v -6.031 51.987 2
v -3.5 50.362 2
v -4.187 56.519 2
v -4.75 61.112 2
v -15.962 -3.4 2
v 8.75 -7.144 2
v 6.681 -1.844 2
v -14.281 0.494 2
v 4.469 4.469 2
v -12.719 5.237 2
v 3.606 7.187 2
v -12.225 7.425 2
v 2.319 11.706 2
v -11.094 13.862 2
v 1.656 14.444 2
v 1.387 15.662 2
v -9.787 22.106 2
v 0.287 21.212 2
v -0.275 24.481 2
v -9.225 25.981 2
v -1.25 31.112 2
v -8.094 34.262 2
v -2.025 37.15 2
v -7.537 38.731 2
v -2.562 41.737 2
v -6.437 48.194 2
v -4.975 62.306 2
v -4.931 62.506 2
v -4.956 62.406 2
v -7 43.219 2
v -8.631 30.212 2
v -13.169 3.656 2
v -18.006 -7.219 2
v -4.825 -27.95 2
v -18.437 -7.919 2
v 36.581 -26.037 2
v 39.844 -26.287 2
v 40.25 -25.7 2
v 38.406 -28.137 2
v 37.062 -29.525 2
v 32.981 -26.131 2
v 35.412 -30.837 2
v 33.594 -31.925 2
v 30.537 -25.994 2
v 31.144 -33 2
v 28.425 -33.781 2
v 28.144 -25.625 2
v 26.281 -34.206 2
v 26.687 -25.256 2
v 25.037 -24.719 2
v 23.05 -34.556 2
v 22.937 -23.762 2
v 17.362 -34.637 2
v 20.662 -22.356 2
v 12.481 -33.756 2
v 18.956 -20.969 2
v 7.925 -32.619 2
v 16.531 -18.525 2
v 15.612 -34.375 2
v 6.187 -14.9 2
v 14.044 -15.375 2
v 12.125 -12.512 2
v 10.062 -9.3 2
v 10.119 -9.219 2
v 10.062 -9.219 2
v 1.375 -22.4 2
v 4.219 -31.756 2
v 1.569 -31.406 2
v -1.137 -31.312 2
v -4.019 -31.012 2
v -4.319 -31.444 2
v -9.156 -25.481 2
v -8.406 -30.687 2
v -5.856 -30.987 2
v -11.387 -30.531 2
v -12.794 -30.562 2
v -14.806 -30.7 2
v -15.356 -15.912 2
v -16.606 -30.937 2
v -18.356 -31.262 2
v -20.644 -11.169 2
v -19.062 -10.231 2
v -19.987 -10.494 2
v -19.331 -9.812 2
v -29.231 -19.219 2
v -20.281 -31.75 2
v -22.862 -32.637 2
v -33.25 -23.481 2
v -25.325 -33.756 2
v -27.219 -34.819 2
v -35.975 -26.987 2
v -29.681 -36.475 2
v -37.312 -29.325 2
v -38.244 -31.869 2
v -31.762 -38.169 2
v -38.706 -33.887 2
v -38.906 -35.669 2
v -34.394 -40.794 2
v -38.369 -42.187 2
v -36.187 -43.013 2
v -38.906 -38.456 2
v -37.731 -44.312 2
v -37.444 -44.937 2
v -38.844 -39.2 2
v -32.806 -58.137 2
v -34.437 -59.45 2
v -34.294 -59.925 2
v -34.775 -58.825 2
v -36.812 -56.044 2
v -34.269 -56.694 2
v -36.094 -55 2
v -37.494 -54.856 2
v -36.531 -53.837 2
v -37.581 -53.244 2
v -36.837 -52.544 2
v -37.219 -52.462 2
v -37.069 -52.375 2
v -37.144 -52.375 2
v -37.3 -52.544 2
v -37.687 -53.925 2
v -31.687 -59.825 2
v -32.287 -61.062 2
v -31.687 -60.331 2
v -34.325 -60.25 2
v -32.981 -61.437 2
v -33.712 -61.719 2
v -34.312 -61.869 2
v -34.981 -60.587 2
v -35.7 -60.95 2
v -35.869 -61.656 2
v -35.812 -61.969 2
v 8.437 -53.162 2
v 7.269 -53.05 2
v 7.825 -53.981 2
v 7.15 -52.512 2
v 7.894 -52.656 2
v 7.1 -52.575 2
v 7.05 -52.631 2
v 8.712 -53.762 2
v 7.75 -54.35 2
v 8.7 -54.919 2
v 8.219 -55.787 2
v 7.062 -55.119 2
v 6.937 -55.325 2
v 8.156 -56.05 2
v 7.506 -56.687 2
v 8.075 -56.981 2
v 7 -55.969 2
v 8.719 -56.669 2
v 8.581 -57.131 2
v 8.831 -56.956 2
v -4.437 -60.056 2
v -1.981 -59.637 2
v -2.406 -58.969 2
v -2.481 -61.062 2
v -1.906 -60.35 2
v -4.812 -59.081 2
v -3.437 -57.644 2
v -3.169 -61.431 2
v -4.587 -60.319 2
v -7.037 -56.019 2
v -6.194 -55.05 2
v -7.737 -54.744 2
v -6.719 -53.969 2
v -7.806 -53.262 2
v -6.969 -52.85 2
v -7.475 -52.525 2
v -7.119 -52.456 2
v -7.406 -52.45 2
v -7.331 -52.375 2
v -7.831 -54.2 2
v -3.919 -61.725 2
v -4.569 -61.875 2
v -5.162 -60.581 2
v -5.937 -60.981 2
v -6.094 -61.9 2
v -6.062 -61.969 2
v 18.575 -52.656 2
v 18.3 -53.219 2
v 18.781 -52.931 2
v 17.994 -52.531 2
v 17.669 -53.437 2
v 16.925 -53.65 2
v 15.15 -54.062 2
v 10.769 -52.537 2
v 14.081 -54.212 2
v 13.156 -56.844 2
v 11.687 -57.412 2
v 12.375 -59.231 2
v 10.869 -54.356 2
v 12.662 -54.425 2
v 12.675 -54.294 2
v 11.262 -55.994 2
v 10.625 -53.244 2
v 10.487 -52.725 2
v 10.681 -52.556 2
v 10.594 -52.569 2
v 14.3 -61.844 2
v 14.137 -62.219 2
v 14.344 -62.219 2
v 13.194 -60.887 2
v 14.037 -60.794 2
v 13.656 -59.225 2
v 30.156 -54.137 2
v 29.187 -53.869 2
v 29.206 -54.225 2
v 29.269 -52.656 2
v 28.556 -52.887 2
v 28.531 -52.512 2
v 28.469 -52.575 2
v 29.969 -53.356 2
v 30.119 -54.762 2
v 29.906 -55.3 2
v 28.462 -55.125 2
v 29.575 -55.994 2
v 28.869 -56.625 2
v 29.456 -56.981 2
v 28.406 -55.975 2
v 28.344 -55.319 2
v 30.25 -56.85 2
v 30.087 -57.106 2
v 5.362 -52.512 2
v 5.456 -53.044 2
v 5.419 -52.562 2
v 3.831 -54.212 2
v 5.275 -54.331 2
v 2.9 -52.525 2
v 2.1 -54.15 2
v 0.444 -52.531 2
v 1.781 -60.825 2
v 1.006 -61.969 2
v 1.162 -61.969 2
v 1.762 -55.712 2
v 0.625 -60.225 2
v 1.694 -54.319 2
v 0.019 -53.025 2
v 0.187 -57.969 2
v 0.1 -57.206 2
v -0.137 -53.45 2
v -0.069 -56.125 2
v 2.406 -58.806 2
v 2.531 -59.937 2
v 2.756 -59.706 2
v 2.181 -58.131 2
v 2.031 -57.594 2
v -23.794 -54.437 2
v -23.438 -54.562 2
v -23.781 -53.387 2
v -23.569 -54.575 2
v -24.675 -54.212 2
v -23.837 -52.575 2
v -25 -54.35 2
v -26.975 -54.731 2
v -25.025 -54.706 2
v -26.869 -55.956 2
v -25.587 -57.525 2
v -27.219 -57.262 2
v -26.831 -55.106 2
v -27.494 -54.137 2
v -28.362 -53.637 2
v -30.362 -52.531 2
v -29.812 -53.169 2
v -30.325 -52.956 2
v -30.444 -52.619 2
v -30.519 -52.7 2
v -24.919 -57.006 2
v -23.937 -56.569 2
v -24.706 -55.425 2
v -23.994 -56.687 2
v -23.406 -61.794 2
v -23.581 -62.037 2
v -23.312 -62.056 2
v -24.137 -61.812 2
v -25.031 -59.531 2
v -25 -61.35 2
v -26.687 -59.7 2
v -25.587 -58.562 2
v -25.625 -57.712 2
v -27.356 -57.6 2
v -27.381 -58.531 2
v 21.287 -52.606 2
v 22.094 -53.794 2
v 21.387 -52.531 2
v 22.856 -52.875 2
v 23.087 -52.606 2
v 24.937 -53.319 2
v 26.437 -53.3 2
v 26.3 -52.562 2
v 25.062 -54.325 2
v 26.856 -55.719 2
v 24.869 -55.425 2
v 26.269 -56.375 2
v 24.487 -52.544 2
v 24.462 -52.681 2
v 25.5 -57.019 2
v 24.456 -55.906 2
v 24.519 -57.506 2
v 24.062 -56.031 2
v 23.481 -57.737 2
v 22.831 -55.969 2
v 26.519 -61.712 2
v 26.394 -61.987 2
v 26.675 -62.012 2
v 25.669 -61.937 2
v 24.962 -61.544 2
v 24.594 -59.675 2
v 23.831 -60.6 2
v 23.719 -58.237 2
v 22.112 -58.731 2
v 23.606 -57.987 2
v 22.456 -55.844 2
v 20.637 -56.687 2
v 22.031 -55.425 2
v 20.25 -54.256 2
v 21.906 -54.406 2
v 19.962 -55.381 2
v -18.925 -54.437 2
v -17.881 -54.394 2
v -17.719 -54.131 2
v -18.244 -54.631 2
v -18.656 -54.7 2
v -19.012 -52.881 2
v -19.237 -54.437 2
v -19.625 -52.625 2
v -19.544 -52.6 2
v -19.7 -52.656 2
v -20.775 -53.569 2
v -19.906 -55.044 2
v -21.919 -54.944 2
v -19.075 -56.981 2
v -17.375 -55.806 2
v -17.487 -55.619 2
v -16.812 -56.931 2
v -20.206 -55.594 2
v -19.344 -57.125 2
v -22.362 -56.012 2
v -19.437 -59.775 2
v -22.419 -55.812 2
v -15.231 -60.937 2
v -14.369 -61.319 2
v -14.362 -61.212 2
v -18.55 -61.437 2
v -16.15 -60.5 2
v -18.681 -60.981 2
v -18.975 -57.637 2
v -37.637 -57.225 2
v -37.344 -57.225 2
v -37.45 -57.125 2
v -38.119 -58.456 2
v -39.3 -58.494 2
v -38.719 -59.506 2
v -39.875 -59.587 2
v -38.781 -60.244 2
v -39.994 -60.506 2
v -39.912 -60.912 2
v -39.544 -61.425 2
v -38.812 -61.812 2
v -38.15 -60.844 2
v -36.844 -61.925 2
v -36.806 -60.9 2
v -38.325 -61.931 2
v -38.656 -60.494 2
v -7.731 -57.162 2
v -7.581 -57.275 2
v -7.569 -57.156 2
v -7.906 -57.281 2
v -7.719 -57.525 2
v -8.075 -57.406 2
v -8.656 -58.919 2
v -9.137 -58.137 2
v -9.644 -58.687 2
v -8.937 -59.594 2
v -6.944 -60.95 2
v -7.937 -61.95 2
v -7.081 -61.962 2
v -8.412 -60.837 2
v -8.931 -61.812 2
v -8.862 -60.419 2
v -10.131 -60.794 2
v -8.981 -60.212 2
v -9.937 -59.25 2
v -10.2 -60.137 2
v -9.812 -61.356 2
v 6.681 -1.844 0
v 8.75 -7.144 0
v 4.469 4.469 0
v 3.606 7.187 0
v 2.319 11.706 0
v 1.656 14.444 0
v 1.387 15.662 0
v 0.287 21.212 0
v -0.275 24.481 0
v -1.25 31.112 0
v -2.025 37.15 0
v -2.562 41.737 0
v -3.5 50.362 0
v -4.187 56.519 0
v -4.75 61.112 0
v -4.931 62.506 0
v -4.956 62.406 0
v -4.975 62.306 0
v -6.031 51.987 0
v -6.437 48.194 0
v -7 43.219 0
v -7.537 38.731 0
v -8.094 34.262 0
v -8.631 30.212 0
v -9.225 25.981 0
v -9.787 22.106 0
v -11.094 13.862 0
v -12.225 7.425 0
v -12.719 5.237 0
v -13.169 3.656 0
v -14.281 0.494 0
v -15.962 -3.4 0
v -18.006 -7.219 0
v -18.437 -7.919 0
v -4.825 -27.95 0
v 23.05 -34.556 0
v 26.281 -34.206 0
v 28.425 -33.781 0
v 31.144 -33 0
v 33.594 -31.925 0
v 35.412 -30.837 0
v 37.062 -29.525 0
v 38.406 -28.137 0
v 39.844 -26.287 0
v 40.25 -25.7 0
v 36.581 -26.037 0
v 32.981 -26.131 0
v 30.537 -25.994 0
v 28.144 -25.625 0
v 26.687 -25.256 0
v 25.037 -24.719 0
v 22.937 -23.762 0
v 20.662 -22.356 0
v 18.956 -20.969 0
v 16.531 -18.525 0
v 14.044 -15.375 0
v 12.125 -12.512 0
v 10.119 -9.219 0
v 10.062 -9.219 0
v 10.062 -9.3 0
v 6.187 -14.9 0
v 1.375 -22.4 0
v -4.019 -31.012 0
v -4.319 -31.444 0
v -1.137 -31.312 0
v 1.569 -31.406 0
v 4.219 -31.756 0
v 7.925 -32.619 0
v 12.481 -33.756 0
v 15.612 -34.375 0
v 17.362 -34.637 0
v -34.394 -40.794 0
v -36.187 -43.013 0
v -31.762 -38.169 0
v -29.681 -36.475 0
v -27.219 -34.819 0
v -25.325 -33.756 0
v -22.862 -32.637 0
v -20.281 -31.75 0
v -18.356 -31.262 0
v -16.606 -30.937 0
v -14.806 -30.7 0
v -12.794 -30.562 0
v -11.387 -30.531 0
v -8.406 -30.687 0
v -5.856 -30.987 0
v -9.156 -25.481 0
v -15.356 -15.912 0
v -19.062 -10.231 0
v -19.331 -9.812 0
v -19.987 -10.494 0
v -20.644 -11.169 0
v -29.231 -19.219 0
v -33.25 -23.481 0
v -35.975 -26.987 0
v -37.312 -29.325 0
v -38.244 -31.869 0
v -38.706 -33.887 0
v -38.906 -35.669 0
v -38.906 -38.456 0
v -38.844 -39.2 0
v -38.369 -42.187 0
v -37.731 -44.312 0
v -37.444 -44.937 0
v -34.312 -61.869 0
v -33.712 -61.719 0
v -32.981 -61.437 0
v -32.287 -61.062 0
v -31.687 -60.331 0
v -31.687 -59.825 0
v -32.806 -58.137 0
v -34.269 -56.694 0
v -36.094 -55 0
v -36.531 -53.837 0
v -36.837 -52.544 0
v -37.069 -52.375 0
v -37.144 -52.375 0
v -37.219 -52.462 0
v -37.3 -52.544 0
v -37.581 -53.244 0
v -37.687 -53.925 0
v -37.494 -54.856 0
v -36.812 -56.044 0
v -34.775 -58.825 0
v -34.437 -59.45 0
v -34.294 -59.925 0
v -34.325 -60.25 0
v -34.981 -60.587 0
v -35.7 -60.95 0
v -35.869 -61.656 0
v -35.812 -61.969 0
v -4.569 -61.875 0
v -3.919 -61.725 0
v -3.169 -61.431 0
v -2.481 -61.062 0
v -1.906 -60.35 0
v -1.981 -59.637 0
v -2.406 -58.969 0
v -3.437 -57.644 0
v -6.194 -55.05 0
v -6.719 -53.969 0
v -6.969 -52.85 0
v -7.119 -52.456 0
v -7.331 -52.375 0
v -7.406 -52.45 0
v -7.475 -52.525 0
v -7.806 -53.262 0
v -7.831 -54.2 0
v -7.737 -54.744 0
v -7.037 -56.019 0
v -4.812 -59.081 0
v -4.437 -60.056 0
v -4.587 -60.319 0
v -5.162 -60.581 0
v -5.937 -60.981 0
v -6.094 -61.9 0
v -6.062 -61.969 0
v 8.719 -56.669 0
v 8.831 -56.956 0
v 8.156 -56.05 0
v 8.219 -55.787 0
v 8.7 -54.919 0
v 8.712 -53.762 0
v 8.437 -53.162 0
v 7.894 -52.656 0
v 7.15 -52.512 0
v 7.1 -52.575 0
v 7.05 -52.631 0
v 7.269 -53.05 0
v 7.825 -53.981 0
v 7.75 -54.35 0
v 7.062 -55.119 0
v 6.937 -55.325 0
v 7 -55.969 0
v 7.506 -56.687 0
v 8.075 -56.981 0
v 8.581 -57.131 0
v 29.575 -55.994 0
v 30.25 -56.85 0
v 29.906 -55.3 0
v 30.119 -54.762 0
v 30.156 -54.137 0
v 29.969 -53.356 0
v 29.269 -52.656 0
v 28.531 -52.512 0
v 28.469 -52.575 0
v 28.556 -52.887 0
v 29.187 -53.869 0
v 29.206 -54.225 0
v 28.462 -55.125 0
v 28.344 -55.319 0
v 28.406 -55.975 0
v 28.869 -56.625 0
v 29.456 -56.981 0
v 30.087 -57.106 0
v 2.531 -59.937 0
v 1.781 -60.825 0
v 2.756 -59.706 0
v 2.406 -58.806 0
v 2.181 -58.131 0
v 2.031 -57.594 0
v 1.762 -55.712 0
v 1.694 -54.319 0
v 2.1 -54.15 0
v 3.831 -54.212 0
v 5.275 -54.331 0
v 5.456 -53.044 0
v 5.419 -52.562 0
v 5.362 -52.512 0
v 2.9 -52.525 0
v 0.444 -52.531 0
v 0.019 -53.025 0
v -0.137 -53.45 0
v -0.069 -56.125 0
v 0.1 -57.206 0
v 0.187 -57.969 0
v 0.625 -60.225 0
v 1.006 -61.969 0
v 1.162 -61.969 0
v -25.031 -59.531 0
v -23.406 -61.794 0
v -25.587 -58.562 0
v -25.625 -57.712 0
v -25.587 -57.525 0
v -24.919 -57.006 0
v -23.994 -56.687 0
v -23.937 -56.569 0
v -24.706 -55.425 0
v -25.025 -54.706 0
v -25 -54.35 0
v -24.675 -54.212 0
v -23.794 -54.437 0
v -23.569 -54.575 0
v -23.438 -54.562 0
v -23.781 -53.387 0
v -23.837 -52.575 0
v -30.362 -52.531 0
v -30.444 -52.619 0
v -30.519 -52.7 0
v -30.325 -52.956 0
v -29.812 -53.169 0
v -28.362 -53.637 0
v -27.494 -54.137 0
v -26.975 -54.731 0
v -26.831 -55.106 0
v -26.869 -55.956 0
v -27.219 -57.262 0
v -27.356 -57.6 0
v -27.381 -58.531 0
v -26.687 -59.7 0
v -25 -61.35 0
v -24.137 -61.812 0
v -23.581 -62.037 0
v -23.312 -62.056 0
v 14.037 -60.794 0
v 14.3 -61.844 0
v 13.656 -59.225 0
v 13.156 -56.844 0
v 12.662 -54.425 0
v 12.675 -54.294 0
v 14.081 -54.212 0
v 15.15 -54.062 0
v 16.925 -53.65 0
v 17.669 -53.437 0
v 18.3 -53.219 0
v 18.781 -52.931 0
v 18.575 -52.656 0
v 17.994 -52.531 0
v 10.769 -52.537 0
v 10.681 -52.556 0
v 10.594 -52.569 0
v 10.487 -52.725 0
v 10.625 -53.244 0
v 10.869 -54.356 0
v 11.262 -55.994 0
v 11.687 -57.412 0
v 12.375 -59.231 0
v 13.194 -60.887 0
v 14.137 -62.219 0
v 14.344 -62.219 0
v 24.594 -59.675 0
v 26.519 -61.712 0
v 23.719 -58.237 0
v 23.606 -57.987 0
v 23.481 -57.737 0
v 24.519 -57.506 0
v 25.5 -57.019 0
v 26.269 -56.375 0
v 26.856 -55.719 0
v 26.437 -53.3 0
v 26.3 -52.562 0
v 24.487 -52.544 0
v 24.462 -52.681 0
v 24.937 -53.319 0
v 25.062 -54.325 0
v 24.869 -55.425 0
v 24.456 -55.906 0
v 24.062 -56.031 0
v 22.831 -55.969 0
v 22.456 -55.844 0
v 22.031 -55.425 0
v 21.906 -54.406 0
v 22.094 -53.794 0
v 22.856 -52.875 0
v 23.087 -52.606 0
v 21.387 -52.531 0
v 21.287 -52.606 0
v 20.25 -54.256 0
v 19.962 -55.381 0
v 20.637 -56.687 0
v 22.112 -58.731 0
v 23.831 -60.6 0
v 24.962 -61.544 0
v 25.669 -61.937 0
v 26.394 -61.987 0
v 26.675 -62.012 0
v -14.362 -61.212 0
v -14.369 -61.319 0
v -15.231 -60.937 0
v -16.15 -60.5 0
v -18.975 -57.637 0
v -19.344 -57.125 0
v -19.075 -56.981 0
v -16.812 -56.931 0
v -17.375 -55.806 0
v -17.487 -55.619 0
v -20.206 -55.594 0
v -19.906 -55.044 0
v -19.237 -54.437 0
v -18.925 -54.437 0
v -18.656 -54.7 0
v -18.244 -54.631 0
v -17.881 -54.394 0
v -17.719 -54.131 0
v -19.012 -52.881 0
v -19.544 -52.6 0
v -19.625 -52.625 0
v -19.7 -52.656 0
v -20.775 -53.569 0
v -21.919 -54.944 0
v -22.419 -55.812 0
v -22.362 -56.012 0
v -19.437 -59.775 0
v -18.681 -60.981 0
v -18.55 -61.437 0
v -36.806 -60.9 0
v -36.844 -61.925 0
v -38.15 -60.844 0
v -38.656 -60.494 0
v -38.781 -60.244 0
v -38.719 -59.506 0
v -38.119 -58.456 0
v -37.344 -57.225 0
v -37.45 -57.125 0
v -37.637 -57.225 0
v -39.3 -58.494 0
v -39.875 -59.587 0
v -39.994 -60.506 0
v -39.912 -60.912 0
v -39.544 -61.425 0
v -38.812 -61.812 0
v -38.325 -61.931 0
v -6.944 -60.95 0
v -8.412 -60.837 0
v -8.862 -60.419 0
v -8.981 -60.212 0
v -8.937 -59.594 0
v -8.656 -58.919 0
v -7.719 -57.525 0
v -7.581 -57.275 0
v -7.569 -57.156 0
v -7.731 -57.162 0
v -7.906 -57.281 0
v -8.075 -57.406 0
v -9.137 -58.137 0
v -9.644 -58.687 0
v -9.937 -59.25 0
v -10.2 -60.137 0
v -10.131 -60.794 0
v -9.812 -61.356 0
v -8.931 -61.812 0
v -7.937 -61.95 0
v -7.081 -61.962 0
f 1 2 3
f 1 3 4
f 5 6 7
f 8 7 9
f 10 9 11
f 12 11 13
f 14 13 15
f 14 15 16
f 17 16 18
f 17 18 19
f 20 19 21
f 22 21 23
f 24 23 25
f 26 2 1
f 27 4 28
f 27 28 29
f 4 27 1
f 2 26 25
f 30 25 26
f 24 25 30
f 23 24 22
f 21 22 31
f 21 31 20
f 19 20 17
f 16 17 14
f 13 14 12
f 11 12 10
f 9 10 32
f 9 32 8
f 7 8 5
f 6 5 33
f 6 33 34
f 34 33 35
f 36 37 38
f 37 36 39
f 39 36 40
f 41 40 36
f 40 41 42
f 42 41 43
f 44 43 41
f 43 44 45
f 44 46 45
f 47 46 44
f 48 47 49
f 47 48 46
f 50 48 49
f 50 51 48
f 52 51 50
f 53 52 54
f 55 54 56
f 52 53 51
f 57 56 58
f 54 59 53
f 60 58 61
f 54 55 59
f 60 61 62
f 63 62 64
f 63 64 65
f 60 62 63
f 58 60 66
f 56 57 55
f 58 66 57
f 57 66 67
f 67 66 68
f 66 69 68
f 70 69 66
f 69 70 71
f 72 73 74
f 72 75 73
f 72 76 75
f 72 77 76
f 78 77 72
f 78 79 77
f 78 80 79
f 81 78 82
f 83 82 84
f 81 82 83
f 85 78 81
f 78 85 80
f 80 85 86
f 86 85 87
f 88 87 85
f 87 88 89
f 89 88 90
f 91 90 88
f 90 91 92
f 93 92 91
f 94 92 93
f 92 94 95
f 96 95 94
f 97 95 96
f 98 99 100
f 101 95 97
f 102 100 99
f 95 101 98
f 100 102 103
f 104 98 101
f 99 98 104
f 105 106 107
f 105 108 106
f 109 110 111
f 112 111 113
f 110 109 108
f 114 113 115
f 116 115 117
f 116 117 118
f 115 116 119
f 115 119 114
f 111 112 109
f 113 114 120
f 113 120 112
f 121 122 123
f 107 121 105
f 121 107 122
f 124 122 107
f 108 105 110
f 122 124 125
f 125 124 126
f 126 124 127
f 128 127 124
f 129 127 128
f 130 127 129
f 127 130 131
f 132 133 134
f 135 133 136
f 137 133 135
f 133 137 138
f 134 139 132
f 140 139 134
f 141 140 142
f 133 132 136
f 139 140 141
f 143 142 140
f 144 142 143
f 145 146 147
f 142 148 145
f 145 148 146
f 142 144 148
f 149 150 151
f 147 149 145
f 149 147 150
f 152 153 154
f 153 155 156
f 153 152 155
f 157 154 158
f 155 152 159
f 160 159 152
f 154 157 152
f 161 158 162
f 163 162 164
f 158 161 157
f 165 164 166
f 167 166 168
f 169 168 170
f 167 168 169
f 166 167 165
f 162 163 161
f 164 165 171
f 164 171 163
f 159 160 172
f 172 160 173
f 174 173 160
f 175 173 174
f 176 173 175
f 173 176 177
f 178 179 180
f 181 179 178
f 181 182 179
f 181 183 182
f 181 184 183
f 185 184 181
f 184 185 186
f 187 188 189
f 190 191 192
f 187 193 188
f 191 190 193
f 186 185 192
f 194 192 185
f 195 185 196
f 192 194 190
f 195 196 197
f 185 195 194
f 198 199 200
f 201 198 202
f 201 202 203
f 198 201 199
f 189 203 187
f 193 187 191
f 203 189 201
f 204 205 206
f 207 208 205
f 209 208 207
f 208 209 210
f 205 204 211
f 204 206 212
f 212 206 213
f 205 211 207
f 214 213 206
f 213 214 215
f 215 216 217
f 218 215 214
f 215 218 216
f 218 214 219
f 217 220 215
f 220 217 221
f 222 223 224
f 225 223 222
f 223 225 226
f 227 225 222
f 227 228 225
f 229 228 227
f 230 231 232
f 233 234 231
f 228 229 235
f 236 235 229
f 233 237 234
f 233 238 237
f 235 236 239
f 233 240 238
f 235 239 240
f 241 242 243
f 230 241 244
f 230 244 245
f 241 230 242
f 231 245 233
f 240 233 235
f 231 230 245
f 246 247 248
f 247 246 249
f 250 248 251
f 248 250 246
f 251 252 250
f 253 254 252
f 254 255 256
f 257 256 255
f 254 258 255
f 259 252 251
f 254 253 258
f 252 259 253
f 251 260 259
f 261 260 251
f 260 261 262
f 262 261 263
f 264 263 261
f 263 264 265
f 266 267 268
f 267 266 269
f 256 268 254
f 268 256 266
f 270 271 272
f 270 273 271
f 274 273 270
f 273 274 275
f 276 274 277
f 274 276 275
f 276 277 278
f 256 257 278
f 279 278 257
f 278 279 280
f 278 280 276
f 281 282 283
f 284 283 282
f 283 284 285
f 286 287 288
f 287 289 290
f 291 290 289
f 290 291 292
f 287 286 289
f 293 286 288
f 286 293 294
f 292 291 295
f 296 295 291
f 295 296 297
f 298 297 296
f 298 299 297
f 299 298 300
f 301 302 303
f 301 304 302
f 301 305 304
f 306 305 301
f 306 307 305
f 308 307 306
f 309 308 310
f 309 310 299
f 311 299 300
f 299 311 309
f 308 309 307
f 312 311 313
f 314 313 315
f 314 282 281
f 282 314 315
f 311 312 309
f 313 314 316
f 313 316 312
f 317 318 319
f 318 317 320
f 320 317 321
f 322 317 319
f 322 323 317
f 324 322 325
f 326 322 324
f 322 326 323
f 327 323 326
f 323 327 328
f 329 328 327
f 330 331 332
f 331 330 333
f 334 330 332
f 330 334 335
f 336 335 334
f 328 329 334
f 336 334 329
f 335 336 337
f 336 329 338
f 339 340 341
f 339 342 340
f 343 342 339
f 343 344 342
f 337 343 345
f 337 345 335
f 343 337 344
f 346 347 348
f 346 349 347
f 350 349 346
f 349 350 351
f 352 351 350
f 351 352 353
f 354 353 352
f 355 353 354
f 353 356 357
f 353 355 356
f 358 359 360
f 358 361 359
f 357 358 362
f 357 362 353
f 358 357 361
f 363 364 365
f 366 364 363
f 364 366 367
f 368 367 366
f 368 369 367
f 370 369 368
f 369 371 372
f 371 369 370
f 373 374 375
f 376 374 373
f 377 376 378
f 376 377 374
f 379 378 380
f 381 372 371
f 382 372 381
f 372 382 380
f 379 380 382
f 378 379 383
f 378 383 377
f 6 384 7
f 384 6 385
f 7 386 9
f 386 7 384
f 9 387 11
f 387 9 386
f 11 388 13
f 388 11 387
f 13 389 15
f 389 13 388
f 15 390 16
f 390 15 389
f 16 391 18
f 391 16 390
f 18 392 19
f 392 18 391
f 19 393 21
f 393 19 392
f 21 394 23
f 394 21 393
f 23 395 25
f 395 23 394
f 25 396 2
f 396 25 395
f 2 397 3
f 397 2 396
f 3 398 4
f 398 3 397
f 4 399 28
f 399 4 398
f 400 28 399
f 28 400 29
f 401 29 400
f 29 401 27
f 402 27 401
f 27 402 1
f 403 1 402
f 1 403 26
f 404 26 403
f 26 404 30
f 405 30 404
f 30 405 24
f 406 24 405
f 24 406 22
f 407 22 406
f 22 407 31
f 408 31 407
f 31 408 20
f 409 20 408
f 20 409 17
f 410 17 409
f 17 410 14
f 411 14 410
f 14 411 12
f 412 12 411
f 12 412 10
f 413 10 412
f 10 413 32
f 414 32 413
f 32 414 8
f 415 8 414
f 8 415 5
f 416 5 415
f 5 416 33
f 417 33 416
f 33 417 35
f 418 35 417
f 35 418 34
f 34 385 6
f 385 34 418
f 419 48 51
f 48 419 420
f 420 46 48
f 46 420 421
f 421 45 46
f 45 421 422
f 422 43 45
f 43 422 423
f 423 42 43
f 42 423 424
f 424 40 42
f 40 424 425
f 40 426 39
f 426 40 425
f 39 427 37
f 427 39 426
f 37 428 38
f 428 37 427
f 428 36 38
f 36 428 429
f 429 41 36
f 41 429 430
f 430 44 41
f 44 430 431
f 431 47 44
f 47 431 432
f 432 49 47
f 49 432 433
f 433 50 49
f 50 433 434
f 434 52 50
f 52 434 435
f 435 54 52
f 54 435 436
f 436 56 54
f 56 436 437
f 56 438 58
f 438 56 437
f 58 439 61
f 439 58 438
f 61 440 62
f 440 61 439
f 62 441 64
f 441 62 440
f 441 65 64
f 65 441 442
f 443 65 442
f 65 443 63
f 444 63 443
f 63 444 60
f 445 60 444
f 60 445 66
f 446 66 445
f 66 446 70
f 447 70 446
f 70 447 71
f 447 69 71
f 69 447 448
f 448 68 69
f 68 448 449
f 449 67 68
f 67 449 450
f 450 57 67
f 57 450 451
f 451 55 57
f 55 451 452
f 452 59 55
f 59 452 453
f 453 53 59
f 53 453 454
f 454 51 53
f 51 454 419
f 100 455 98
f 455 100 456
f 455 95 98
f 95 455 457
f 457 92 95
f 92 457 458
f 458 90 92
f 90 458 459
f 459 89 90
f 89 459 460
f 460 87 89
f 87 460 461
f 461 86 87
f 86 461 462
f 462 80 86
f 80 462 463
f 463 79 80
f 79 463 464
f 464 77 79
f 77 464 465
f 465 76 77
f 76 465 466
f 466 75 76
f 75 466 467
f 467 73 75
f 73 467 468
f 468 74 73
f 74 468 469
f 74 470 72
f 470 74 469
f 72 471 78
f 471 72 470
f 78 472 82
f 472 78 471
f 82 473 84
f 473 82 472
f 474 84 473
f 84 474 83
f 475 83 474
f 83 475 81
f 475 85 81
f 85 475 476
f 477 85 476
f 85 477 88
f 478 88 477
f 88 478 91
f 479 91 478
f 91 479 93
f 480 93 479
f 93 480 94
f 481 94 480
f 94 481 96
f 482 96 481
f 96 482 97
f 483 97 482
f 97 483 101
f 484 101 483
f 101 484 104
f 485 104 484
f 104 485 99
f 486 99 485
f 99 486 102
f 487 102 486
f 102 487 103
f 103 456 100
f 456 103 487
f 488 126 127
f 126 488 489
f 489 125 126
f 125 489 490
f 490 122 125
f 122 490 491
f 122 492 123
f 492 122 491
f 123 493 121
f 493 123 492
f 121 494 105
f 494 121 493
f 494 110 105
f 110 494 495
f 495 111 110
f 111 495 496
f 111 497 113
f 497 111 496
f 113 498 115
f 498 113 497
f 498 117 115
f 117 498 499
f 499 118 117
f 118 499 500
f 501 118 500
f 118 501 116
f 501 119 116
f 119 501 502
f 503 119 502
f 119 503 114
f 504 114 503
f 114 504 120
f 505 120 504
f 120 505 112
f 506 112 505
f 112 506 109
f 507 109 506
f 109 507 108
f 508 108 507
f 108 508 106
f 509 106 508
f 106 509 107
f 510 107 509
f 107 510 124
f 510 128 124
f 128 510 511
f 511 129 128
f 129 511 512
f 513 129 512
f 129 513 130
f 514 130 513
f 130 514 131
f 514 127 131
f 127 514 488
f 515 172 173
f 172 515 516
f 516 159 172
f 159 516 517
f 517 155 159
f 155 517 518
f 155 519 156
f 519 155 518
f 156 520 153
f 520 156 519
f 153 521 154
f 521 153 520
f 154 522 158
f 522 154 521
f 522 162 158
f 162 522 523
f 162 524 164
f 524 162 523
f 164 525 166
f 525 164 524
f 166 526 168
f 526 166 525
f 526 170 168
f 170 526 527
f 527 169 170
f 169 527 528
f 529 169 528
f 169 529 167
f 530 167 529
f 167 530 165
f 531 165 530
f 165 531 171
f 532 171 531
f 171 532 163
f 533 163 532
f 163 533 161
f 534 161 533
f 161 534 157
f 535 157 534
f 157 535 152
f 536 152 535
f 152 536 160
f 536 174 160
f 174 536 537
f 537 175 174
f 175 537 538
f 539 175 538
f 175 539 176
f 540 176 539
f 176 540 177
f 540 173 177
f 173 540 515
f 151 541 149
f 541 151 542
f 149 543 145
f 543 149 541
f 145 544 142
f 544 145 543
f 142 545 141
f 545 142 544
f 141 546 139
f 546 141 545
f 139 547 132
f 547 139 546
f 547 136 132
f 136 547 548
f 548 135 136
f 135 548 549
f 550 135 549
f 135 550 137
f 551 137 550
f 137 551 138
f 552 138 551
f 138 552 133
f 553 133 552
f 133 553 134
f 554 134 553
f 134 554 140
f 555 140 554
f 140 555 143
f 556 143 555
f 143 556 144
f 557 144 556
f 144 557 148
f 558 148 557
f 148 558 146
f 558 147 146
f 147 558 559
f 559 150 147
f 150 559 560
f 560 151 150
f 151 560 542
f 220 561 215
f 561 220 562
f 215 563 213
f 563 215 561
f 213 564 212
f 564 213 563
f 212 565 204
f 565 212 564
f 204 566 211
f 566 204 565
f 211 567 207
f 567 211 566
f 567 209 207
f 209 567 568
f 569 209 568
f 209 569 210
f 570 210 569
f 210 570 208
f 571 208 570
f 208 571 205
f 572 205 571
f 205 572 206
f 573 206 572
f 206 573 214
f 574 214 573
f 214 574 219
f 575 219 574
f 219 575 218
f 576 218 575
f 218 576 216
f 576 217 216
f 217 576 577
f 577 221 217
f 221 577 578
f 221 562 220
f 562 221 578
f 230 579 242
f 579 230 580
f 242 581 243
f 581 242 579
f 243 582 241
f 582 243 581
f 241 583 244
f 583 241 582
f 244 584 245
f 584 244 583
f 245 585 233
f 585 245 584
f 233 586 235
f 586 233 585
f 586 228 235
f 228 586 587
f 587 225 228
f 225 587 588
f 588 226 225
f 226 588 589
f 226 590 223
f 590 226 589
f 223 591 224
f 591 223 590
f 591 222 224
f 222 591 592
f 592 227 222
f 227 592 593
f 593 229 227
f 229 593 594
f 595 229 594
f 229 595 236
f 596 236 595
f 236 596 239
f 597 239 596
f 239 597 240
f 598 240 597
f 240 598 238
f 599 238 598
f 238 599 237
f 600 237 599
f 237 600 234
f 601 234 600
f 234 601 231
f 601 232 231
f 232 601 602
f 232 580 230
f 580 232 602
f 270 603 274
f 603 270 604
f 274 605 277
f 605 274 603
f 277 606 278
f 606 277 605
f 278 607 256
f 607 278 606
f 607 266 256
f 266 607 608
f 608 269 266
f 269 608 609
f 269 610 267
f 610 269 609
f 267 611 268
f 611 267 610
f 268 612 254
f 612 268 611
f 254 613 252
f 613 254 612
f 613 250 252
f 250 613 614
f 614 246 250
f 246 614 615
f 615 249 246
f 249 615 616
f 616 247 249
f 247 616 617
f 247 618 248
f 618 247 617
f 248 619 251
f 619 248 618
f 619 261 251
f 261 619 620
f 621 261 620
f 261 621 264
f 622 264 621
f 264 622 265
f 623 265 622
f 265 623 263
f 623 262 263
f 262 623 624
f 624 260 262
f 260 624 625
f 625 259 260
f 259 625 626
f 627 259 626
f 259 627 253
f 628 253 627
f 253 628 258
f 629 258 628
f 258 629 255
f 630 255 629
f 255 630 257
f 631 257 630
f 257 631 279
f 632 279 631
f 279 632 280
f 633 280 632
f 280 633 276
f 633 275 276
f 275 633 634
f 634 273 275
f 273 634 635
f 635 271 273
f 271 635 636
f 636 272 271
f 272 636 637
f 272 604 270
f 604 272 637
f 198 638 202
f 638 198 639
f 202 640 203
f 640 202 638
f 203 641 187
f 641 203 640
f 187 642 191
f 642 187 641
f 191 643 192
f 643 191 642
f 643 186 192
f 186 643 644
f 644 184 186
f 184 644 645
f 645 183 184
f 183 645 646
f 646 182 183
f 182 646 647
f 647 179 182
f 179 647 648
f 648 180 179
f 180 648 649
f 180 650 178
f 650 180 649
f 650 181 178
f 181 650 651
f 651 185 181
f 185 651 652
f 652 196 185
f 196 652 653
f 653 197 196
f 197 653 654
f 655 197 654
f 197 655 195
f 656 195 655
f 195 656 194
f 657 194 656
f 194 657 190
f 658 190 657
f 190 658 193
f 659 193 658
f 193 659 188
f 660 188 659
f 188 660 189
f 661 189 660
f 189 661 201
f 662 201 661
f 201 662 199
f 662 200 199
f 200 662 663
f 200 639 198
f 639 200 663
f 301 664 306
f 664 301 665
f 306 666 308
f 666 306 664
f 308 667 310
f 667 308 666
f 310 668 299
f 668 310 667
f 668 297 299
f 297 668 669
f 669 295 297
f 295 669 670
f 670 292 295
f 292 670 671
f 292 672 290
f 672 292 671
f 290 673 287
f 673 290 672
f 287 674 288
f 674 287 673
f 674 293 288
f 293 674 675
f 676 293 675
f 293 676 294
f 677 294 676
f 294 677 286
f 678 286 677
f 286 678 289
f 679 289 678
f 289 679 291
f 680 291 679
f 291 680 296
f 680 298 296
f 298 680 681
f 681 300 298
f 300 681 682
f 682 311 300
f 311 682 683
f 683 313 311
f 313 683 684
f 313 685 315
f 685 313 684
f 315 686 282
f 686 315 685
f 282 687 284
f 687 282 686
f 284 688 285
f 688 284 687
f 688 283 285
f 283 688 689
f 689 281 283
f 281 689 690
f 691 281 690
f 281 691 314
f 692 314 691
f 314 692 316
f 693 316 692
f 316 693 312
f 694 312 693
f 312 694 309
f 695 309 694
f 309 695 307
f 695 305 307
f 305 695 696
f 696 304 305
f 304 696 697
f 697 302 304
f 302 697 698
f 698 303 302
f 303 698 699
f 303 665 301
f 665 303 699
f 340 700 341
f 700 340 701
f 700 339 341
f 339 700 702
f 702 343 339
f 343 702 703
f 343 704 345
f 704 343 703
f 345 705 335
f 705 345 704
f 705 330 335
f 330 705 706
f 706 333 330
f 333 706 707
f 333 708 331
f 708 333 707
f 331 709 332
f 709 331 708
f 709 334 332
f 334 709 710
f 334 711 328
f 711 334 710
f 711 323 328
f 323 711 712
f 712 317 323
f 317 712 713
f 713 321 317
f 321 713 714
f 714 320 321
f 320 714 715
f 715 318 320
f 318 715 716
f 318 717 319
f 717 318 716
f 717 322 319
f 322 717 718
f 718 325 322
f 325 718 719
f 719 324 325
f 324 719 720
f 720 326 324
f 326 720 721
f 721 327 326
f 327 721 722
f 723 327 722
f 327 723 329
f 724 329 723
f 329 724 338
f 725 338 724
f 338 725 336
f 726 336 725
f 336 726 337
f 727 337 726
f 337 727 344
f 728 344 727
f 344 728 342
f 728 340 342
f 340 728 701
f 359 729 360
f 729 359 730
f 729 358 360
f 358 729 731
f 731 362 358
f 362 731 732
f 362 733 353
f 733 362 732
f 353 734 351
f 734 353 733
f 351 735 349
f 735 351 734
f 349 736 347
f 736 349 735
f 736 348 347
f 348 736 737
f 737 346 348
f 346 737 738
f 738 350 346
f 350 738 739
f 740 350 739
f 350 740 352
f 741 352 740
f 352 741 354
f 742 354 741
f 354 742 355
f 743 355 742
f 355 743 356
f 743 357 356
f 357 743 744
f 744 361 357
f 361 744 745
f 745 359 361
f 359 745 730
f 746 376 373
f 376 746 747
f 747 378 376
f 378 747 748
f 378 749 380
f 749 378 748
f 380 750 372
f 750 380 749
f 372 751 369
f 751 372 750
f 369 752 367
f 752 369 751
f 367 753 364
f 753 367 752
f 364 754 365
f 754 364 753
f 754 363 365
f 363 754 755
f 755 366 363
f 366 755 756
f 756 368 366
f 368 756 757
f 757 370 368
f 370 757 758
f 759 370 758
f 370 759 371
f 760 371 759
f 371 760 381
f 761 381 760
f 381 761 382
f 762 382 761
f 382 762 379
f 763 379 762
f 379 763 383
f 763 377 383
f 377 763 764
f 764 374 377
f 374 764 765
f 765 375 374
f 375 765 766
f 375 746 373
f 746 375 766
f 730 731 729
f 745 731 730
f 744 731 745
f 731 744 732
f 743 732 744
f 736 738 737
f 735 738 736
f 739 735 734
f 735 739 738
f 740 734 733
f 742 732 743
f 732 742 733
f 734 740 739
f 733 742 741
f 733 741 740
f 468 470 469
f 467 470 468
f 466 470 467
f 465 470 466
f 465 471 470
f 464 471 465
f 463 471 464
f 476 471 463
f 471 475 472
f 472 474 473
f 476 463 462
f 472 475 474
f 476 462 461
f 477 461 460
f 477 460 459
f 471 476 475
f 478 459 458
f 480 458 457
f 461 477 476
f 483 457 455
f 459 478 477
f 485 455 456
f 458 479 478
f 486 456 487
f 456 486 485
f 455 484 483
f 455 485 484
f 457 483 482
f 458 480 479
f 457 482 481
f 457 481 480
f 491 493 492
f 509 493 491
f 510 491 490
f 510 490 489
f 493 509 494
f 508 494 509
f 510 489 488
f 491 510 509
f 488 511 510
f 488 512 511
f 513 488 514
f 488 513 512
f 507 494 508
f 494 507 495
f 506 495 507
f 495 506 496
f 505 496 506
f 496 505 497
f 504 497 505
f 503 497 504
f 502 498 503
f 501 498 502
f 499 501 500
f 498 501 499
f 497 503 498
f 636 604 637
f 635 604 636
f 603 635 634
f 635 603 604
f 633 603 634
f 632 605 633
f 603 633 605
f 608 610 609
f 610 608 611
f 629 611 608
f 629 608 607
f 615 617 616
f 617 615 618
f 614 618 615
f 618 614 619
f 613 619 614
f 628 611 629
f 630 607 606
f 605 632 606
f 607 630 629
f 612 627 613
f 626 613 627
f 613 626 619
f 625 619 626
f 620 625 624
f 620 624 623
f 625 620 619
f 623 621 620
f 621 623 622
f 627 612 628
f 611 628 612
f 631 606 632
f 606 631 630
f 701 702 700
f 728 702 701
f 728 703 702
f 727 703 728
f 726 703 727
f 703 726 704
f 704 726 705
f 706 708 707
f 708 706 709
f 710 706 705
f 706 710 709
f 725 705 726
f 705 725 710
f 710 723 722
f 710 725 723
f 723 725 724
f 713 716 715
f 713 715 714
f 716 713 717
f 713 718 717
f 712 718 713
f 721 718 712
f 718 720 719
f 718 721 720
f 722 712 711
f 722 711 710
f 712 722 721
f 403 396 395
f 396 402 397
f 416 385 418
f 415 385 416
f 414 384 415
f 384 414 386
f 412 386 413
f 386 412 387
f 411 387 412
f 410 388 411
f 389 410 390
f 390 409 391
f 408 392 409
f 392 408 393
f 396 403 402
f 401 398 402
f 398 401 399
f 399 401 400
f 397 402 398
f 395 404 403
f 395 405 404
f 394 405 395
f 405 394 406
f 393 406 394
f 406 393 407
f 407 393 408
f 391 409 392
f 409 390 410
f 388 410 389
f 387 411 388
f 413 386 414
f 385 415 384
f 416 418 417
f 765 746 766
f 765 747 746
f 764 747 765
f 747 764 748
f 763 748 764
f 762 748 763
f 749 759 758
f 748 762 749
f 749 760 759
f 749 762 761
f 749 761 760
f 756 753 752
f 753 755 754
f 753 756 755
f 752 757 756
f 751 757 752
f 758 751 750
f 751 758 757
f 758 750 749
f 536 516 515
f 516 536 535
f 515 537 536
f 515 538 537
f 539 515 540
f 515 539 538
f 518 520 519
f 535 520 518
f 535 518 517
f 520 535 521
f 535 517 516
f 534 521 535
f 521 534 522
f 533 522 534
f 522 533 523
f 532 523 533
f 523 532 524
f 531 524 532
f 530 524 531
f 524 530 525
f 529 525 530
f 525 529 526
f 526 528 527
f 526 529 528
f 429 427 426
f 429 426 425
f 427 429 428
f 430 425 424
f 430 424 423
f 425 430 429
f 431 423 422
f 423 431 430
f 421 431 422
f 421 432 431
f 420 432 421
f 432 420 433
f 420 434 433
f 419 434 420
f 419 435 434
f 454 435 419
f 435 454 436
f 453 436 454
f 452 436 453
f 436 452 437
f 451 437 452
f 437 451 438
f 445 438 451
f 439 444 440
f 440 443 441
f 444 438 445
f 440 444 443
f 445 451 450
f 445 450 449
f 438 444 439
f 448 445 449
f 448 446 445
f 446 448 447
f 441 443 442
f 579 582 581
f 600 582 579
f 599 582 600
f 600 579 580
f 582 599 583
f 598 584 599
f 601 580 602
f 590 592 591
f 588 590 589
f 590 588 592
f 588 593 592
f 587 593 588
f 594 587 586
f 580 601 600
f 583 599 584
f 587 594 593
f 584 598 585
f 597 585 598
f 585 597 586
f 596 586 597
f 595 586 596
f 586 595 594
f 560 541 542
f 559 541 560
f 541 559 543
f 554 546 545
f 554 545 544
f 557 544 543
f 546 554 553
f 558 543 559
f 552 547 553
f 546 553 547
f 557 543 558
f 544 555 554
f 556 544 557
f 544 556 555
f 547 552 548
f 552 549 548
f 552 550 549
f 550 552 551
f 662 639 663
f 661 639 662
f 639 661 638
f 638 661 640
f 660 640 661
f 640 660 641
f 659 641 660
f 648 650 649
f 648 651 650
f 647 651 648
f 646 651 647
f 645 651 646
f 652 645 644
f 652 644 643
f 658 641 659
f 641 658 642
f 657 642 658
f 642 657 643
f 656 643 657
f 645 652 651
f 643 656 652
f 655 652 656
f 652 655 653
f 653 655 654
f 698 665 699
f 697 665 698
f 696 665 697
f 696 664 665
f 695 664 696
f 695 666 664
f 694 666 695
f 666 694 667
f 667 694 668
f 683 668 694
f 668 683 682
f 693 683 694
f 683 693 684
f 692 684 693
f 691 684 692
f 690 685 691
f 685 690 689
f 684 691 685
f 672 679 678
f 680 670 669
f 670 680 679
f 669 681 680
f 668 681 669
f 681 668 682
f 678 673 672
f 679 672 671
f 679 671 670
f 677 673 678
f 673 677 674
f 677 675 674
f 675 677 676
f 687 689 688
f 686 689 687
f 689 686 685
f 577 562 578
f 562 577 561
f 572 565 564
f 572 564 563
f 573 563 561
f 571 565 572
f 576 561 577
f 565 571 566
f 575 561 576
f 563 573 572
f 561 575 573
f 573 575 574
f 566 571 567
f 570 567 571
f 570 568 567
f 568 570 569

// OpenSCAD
module 17244f0232cb8f6ca03ed6fc7fb4ccea_1()
{
 /* Generated by trace2scad version 20150415
    http://aggregate.org/MAKE/TRACE2SCAD/
    Optimized model has 387/4796 original points
 */
 color([0.48, 0.48, 0.48])
 assign(minx=0) /* polygon minx=39 */
 assign(miny=0) /* polygon miny=45 */
 assign(maxx=12880) /* polygon maxx=12880 */
 assign(maxy=20000) /* polygon maxy=20001 */
 assign(dx=maxx-minx)
 assign(dy=maxy-miny)
 assign(maxd=((dx>dy)?dx:dy))
 scale([1/maxd, 1/maxd, 1])
 translate([-minx-dx/2, -miny-dy/2, 0])
 linear_extrude(height=1, convexity=387)
 union() {
  union() {
   polygon([[5647,19985],[5644,19969],[5475,18318],[5410,17711],[5320,16915],[5234,16197],[5145,15482],[5059,14834],[4964,14157],[4874,13537],[4665,12218],[4484,11188],[4405,10838],[4333,10585],[4155,10079],[3886,9456],[3559,8845],[3490,8733],[5668,5528],[7840,8857],[7509,9705],[7155,10715],[7017,11150],[6811,11873],[6705,12311],[6662,12506],[6486,13394],[6396,13917],[6240,14978],[6116,15944],[6030,16678],[5880,18058],[5770,19043],[5680,19778],[5651,20001]], convexity=6);
   polygon([[8050,8518],[8050,8512],[7430,7616],[6660,6416],[5797,5038],[5749,4969],[6258,4990],[6691,4975],[7115,4919],[7708,4781],[8437,4599],[8938,4500],[9218,4458],[10128,4471],[10645,4527],[10988,4595],[11423,4720],[11815,4892],[12106,5066],[12370,5276],[12585,5498],[12815,5794],[12880,5888],[12293,5834],[11717,5819],[11326,5841],[10943,5900],[10710,5959],[10446,6045],[10110,6198],[9746,6423],[9473,6645],[9085,7036],[8687,7540],[8380,7998],[8059,8525],[8050,8525]], convexity=9);
   polygon([[3242,8321],[3137,8213],[1763,6925],[1120,6243],[684,5682],[470,5308],[321,4901],[247,4578],[215,4293],[215,3847],[225,3728],[301,3250],[403,2910],[449,2810],[650,3118],[937,3473],[1358,3893],[1691,4164],[2085,4429],[2388,4599],[2782,4778],[3195,4920],[3503,4998],[3783,5050],[4071,5088],[4393,5110],[4618,5115],[5095,5090],[5503,5042],[4975,5923],[3983,7454],[3390,8363],[3347,8430]], convexity=7);
   polygon([[485,1606],[472,1593],[427,1481],[410,1372],[441,1223],[550,1033],[876,588],[930,488],[953,412],[948,360],[843,306],[728,248],[701,135],[710,85],[950,101],[1046,125],[1163,170],[1274,230],[1370,347],[1370,428],[1191,698],[957,929],[665,1200],[595,1386],[546,1593],[509,1620],[497,1620]], convexity=8);
   polygon([[5255,1608],[5244,1596],[5191,1478],[5187,1328],[5202,1241],[5314,1037],[5670,547],[5730,391],[5706,349],[5614,307],[5490,243],[5465,96],[5470,85],[5709,100],[5813,124],[5933,171],[6043,230],[6135,344],[6123,458],[6055,565],[5890,777],[5449,1192],[5365,1365],[5325,1544],[5301,1607],[5267,1620]], convexity=8);
   polygon([[6904,1596],[6511,1595],[6443,1516],[6418,1448],[6429,1020],[6456,847],[6470,725],[6540,364],[6601,85],[6626,85],[6725,268],[6845,410],[6881,447],[6825,591],[6789,699],[6765,785],[6722,1086],[6711,1309],[6776,1336],[7053,1326],[7284,1307],[7313,1513],[7307,1590],[7298,1598]], convexity=10);
   polygon([[7576,1588],[7568,1579],[7603,1512],[7692,1363],[7680,1304],[7570,1181],[7550,1148],[7560,1045],[7641,930],[7732,883],[7813,859],[7853,887],[7835,933],[7745,1032],[7755,1074],[7832,1213],[7834,1398],[7790,1494],[7703,1575],[7584,1598]], convexity=10);
   polygon([[11000,1593],[10995,1588],[11009,1538],[11110,1381],[11113,1324],[10994,1180],[10975,1149],[10985,1044],[11059,940],[11153,883],[11254,863],[11280,904],[11172,1041],[11225,1152],[11259,1238],[11265,1338],[11235,1463],[11123,1575],[11005,1598]], convexity=10);
   polygon([[1569,1581],[1557,1568],[1588,1527],[1670,1493],[1902,1418],[2041,1338],[2124,1243],[2147,1183],[2141,1047],[2085,838],[2063,784],[2059,635],[2170,448],[2440,184],[2578,110],[2667,74],[2710,71],[2695,113],[2435,475],[2346,630],[2340,766],[2346,796],[2453,879],[2601,930],[2610,949],[2487,1132],[2436,1247],[2440,1304],[2492,1326],[2633,1290],[2669,1268],[2690,1270],[2635,1458],[2626,1588],[1582,1595]], convexity=13);
   polygon([[8149,1591],[8135,1589],[8118,1564],[8140,1481],[8179,1303],[8242,1041],[8310,814],[8420,523],[8551,258],[8702,45],[8735,45],[8728,105],[8686,273],[8625,524],[8545,905],[8466,1292],[8468,1313],[8693,1326],[8864,1350],[9148,1416],[9267,1450],[9368,1485],[9445,1531],[9412,1575],[9319,1595],[8163,1594]], convexity=9);
   polygon([[9854,1589],[9846,1583],[9680,1319],[9634,1139],[9742,930],[9978,603],[10253,304],[10434,153],[10547,90],[10663,82],[10708,78],[10683,126],[10375,452],[10235,682],[10217,722],[10197,762],[10363,799],[10520,877],[10643,980],[10737,1085],[10670,1472],[10648,1590],[10358,1593],[10354,1571],[10430,1469],[10450,1308],[10419,1132],[10353,1055],[10290,1035],[10093,1045],[10033,1065],[9965,1132],[9945,1295],[9975,1393],[10097,1540],[10134,1583],[9862,1595]], convexity=13);
   polygon([[3300,1580],[3288,1575],[3116,1429],[2933,1209],[2853,1070],[2862,1038],[3330,436],[3451,243],[3472,170],[4141,189],[4142,206],[4003,250],[3856,320],[3404,778],[3345,860],[3388,883],[3750,891],[3660,1071],[3642,1101],[3207,1105],[3255,1193],[3362,1290],[3412,1290],[3455,1248],[3521,1259],[3579,1297],[3605,1339],[3398,1539],[3313,1584]], convexity=12);
   polygon([[433,852],[418,844],[152,641],[60,466],[41,319],[54,254],[113,172],[230,110],[308,91],[545,92],[551,256],[336,265],[255,321],[235,361],[245,479],[341,647],[465,844],[448,860]], convexity=8);
   polygon([[5175,835],[5148,815],[4978,698],[4897,610],[4850,520],[4808,378],[4819,273],[4870,183],[5011,110],[5170,88],[5307,86],[5329,248],[5094,266],[5022,333],[5003,366],[5010,465],[5055,573],[5205,796],[5227,836],[5229,855],[5203,854]], convexity=8);
  }
 }
}

module 17244f0232cb8f6ca03ed6fc7fb4ccea()
{
 /* all layers combined, scaled to within a 1mm cube */
 scale([1, 1, 1/1])
 difference() {
  union() {
   scale([1,1,2]) translate([0,0,-0.5]) 17244f0232cb8f6ca03ed6fc7fb4ccea_1();
  }
  translate([0,0,-2]) cube([2,2,4],center=true);
 }
}

scale([125, 125, 2]) {
	17244f0232cb8f6ca03ed6fc7fb4ccea();
}
